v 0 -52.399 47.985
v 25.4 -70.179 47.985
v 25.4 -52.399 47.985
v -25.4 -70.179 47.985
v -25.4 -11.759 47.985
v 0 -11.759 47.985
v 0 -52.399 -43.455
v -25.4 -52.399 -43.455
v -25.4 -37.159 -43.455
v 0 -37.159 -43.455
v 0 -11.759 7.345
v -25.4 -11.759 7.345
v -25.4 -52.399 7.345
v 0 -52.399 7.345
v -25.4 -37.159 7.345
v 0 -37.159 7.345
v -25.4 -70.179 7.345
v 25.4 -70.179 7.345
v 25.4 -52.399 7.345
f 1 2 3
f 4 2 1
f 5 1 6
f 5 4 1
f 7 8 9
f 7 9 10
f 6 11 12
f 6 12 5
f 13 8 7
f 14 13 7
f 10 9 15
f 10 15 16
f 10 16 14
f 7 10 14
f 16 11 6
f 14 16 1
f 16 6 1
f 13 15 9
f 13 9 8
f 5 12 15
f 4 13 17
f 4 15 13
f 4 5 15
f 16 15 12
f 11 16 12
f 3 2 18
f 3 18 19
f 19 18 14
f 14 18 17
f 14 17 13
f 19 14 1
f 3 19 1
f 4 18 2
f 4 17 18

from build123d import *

# Parameters (mm, degrees)
F0_W     = 40.64
F0_H     = 40.64
F0_W_2   = 17.78
F1_DEPTH = 25.4
F2_DEPTH = 25.4
F3_W     = 25.4
F3_H     = 15.24
F4_DEPTH = 50.8


with BuildPart() as f1:
    # F0 (on Right) → F1 (new body)
    with BuildSketch(Plane.YZ):
        with Locations((-32.078979, 27.665098)):
            Rectangle(F0_W, F0_H)
        with Locations((-61.288979, 27.665098)):
            Rectangle(F0_W_2, F0_H)
    extrude(amount=-F1_DEPTH)

    # F0 (on Right) → F2 (join)
    with BuildSketch(Plane.YZ):
        with Locations((-61.288979, 27.665098)):
            Rectangle(F0_W_2, F0_H)
    extrude(amount=F2_DEPTH)

    # F3 (on face) → F4 (join)
    with BuildSketch(Plane(origin=(0, 0, 7.345098), x_dir=(1, 0, 0), z_dir=(0, 0, -1))):
        with Locations((-12.7, 44.778979)):
            Rectangle(F3_W, F3_H)
    extrude(amount=F4_DEPTH)


solid = f1.part
